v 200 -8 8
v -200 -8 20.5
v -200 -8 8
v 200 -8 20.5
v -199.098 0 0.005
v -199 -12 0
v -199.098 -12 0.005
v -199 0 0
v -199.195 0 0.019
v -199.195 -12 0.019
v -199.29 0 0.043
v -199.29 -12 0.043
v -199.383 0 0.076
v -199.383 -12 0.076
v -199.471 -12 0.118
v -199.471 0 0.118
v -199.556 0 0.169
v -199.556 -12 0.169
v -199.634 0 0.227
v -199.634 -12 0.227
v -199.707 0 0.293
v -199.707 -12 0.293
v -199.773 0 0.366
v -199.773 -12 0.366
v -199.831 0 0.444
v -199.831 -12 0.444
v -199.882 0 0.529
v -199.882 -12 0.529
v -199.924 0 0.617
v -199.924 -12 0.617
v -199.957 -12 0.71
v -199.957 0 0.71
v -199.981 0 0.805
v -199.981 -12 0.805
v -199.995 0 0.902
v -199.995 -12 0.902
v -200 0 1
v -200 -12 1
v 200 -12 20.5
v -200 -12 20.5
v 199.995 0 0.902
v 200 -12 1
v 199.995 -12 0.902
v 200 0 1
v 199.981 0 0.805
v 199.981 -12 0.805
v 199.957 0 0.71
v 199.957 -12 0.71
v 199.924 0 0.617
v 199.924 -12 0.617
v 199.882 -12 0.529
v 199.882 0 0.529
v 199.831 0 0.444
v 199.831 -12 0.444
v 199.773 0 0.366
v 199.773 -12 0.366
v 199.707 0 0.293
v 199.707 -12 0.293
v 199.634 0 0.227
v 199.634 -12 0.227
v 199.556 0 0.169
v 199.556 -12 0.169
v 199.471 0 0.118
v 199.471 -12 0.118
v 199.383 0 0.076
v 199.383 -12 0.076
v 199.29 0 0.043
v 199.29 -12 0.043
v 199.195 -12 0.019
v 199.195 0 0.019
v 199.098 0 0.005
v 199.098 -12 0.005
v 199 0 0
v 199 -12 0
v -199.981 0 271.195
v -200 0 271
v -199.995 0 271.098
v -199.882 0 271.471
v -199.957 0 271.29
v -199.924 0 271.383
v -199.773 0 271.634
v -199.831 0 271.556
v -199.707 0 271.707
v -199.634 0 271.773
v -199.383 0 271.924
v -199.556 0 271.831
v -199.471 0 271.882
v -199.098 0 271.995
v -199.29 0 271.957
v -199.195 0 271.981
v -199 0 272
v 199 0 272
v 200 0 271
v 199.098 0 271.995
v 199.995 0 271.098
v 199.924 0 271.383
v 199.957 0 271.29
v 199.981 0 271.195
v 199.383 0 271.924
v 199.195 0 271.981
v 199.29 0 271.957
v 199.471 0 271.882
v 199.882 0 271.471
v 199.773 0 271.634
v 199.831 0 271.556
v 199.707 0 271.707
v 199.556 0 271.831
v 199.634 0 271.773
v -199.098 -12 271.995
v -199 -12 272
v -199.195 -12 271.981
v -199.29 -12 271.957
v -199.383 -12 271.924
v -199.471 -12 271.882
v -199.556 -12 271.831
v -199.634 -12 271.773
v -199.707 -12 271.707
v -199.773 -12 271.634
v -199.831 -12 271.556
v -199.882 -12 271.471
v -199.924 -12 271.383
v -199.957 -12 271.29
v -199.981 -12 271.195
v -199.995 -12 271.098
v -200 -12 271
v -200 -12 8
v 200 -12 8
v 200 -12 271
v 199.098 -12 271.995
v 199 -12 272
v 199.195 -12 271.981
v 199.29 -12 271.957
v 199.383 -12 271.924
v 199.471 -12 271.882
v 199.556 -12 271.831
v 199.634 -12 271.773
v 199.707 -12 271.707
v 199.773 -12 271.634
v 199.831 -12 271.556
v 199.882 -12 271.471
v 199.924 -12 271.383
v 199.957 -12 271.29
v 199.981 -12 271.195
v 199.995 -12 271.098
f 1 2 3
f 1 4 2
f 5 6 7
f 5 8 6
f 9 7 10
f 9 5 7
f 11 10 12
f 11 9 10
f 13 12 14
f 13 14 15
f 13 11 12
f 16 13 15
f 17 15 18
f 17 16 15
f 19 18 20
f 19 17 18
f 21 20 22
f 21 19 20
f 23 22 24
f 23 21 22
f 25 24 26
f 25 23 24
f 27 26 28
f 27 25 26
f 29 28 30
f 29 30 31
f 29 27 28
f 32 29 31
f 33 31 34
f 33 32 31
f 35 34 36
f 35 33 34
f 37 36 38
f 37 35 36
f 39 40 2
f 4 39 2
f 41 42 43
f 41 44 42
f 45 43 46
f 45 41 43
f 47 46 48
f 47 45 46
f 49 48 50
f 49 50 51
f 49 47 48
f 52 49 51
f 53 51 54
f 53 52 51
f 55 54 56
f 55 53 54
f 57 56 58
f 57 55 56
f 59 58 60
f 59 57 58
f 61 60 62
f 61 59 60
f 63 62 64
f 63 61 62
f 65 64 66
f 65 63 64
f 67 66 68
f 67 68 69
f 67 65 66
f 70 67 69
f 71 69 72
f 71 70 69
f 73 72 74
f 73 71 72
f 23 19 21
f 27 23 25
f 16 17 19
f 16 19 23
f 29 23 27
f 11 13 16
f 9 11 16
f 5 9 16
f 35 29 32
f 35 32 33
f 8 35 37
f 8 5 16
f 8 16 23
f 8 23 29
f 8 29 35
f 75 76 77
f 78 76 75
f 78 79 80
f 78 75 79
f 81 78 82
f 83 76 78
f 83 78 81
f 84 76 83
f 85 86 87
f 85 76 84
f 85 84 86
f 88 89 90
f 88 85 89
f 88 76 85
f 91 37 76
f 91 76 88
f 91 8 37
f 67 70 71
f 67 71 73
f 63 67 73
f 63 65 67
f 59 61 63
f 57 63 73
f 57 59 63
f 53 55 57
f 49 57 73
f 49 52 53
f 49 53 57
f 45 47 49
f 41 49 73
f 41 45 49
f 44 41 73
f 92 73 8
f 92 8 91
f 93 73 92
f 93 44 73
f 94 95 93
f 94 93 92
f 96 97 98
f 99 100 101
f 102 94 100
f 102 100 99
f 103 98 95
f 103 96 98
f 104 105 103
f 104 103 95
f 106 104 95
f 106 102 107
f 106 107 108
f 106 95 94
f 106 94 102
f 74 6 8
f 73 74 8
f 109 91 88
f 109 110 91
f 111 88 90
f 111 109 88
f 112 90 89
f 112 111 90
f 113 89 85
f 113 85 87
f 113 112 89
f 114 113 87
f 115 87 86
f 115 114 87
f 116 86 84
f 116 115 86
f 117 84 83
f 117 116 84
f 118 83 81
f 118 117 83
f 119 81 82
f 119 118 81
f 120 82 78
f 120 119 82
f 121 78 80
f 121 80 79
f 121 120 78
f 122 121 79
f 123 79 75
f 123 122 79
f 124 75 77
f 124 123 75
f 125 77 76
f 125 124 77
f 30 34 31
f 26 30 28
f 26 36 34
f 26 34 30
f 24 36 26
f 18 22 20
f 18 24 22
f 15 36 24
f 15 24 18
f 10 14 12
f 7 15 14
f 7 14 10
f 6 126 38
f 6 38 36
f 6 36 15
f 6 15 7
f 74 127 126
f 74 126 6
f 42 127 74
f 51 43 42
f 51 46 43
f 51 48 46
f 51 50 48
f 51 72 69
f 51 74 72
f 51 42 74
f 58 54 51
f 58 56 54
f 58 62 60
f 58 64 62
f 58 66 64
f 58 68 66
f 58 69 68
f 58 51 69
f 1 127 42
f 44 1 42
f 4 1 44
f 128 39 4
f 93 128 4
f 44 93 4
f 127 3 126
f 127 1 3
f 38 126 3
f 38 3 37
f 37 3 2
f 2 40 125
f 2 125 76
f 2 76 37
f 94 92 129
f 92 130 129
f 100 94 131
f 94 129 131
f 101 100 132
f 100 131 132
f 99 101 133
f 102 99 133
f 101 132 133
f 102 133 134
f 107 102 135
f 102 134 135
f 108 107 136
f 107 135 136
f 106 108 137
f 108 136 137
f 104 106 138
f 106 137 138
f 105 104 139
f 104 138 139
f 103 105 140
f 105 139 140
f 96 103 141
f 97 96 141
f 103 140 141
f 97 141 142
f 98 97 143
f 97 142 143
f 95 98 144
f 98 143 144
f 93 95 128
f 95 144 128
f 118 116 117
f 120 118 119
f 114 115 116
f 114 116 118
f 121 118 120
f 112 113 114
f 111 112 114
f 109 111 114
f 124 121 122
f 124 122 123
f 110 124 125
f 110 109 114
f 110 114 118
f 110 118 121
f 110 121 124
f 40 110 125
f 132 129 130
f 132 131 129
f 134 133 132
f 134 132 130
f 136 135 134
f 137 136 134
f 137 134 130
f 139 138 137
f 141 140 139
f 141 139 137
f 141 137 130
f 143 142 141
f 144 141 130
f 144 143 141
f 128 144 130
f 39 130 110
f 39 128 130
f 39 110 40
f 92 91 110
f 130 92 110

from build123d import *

# Parameters (mm, degrees)
F1_DEPTH = 200
F2_R     = 1


with BuildPart() as f1:
    # F0 (on Right) → F1 (new body, symmetric)
    with BuildSketch(Plane.YZ):
        Polygon((-12, 8), (-12, 0), (0, 0), (0, 272), (-12, 272), (-12, 20.5), (-8, 20.5), (-8, 8), align=None)
    extrude(amount=F1_DEPTH, both=True)

    # F2
    f2_edges = [f1.edges().sort_by_distance(p)[0] for p in [
        (-200, -6, 272),
        (200, -6, 272),
        (200, -6, 0),
        (-200, -6, 0),
    ]]
    fillet(f2_edges, radius=F2_R)


solid = f1.part
